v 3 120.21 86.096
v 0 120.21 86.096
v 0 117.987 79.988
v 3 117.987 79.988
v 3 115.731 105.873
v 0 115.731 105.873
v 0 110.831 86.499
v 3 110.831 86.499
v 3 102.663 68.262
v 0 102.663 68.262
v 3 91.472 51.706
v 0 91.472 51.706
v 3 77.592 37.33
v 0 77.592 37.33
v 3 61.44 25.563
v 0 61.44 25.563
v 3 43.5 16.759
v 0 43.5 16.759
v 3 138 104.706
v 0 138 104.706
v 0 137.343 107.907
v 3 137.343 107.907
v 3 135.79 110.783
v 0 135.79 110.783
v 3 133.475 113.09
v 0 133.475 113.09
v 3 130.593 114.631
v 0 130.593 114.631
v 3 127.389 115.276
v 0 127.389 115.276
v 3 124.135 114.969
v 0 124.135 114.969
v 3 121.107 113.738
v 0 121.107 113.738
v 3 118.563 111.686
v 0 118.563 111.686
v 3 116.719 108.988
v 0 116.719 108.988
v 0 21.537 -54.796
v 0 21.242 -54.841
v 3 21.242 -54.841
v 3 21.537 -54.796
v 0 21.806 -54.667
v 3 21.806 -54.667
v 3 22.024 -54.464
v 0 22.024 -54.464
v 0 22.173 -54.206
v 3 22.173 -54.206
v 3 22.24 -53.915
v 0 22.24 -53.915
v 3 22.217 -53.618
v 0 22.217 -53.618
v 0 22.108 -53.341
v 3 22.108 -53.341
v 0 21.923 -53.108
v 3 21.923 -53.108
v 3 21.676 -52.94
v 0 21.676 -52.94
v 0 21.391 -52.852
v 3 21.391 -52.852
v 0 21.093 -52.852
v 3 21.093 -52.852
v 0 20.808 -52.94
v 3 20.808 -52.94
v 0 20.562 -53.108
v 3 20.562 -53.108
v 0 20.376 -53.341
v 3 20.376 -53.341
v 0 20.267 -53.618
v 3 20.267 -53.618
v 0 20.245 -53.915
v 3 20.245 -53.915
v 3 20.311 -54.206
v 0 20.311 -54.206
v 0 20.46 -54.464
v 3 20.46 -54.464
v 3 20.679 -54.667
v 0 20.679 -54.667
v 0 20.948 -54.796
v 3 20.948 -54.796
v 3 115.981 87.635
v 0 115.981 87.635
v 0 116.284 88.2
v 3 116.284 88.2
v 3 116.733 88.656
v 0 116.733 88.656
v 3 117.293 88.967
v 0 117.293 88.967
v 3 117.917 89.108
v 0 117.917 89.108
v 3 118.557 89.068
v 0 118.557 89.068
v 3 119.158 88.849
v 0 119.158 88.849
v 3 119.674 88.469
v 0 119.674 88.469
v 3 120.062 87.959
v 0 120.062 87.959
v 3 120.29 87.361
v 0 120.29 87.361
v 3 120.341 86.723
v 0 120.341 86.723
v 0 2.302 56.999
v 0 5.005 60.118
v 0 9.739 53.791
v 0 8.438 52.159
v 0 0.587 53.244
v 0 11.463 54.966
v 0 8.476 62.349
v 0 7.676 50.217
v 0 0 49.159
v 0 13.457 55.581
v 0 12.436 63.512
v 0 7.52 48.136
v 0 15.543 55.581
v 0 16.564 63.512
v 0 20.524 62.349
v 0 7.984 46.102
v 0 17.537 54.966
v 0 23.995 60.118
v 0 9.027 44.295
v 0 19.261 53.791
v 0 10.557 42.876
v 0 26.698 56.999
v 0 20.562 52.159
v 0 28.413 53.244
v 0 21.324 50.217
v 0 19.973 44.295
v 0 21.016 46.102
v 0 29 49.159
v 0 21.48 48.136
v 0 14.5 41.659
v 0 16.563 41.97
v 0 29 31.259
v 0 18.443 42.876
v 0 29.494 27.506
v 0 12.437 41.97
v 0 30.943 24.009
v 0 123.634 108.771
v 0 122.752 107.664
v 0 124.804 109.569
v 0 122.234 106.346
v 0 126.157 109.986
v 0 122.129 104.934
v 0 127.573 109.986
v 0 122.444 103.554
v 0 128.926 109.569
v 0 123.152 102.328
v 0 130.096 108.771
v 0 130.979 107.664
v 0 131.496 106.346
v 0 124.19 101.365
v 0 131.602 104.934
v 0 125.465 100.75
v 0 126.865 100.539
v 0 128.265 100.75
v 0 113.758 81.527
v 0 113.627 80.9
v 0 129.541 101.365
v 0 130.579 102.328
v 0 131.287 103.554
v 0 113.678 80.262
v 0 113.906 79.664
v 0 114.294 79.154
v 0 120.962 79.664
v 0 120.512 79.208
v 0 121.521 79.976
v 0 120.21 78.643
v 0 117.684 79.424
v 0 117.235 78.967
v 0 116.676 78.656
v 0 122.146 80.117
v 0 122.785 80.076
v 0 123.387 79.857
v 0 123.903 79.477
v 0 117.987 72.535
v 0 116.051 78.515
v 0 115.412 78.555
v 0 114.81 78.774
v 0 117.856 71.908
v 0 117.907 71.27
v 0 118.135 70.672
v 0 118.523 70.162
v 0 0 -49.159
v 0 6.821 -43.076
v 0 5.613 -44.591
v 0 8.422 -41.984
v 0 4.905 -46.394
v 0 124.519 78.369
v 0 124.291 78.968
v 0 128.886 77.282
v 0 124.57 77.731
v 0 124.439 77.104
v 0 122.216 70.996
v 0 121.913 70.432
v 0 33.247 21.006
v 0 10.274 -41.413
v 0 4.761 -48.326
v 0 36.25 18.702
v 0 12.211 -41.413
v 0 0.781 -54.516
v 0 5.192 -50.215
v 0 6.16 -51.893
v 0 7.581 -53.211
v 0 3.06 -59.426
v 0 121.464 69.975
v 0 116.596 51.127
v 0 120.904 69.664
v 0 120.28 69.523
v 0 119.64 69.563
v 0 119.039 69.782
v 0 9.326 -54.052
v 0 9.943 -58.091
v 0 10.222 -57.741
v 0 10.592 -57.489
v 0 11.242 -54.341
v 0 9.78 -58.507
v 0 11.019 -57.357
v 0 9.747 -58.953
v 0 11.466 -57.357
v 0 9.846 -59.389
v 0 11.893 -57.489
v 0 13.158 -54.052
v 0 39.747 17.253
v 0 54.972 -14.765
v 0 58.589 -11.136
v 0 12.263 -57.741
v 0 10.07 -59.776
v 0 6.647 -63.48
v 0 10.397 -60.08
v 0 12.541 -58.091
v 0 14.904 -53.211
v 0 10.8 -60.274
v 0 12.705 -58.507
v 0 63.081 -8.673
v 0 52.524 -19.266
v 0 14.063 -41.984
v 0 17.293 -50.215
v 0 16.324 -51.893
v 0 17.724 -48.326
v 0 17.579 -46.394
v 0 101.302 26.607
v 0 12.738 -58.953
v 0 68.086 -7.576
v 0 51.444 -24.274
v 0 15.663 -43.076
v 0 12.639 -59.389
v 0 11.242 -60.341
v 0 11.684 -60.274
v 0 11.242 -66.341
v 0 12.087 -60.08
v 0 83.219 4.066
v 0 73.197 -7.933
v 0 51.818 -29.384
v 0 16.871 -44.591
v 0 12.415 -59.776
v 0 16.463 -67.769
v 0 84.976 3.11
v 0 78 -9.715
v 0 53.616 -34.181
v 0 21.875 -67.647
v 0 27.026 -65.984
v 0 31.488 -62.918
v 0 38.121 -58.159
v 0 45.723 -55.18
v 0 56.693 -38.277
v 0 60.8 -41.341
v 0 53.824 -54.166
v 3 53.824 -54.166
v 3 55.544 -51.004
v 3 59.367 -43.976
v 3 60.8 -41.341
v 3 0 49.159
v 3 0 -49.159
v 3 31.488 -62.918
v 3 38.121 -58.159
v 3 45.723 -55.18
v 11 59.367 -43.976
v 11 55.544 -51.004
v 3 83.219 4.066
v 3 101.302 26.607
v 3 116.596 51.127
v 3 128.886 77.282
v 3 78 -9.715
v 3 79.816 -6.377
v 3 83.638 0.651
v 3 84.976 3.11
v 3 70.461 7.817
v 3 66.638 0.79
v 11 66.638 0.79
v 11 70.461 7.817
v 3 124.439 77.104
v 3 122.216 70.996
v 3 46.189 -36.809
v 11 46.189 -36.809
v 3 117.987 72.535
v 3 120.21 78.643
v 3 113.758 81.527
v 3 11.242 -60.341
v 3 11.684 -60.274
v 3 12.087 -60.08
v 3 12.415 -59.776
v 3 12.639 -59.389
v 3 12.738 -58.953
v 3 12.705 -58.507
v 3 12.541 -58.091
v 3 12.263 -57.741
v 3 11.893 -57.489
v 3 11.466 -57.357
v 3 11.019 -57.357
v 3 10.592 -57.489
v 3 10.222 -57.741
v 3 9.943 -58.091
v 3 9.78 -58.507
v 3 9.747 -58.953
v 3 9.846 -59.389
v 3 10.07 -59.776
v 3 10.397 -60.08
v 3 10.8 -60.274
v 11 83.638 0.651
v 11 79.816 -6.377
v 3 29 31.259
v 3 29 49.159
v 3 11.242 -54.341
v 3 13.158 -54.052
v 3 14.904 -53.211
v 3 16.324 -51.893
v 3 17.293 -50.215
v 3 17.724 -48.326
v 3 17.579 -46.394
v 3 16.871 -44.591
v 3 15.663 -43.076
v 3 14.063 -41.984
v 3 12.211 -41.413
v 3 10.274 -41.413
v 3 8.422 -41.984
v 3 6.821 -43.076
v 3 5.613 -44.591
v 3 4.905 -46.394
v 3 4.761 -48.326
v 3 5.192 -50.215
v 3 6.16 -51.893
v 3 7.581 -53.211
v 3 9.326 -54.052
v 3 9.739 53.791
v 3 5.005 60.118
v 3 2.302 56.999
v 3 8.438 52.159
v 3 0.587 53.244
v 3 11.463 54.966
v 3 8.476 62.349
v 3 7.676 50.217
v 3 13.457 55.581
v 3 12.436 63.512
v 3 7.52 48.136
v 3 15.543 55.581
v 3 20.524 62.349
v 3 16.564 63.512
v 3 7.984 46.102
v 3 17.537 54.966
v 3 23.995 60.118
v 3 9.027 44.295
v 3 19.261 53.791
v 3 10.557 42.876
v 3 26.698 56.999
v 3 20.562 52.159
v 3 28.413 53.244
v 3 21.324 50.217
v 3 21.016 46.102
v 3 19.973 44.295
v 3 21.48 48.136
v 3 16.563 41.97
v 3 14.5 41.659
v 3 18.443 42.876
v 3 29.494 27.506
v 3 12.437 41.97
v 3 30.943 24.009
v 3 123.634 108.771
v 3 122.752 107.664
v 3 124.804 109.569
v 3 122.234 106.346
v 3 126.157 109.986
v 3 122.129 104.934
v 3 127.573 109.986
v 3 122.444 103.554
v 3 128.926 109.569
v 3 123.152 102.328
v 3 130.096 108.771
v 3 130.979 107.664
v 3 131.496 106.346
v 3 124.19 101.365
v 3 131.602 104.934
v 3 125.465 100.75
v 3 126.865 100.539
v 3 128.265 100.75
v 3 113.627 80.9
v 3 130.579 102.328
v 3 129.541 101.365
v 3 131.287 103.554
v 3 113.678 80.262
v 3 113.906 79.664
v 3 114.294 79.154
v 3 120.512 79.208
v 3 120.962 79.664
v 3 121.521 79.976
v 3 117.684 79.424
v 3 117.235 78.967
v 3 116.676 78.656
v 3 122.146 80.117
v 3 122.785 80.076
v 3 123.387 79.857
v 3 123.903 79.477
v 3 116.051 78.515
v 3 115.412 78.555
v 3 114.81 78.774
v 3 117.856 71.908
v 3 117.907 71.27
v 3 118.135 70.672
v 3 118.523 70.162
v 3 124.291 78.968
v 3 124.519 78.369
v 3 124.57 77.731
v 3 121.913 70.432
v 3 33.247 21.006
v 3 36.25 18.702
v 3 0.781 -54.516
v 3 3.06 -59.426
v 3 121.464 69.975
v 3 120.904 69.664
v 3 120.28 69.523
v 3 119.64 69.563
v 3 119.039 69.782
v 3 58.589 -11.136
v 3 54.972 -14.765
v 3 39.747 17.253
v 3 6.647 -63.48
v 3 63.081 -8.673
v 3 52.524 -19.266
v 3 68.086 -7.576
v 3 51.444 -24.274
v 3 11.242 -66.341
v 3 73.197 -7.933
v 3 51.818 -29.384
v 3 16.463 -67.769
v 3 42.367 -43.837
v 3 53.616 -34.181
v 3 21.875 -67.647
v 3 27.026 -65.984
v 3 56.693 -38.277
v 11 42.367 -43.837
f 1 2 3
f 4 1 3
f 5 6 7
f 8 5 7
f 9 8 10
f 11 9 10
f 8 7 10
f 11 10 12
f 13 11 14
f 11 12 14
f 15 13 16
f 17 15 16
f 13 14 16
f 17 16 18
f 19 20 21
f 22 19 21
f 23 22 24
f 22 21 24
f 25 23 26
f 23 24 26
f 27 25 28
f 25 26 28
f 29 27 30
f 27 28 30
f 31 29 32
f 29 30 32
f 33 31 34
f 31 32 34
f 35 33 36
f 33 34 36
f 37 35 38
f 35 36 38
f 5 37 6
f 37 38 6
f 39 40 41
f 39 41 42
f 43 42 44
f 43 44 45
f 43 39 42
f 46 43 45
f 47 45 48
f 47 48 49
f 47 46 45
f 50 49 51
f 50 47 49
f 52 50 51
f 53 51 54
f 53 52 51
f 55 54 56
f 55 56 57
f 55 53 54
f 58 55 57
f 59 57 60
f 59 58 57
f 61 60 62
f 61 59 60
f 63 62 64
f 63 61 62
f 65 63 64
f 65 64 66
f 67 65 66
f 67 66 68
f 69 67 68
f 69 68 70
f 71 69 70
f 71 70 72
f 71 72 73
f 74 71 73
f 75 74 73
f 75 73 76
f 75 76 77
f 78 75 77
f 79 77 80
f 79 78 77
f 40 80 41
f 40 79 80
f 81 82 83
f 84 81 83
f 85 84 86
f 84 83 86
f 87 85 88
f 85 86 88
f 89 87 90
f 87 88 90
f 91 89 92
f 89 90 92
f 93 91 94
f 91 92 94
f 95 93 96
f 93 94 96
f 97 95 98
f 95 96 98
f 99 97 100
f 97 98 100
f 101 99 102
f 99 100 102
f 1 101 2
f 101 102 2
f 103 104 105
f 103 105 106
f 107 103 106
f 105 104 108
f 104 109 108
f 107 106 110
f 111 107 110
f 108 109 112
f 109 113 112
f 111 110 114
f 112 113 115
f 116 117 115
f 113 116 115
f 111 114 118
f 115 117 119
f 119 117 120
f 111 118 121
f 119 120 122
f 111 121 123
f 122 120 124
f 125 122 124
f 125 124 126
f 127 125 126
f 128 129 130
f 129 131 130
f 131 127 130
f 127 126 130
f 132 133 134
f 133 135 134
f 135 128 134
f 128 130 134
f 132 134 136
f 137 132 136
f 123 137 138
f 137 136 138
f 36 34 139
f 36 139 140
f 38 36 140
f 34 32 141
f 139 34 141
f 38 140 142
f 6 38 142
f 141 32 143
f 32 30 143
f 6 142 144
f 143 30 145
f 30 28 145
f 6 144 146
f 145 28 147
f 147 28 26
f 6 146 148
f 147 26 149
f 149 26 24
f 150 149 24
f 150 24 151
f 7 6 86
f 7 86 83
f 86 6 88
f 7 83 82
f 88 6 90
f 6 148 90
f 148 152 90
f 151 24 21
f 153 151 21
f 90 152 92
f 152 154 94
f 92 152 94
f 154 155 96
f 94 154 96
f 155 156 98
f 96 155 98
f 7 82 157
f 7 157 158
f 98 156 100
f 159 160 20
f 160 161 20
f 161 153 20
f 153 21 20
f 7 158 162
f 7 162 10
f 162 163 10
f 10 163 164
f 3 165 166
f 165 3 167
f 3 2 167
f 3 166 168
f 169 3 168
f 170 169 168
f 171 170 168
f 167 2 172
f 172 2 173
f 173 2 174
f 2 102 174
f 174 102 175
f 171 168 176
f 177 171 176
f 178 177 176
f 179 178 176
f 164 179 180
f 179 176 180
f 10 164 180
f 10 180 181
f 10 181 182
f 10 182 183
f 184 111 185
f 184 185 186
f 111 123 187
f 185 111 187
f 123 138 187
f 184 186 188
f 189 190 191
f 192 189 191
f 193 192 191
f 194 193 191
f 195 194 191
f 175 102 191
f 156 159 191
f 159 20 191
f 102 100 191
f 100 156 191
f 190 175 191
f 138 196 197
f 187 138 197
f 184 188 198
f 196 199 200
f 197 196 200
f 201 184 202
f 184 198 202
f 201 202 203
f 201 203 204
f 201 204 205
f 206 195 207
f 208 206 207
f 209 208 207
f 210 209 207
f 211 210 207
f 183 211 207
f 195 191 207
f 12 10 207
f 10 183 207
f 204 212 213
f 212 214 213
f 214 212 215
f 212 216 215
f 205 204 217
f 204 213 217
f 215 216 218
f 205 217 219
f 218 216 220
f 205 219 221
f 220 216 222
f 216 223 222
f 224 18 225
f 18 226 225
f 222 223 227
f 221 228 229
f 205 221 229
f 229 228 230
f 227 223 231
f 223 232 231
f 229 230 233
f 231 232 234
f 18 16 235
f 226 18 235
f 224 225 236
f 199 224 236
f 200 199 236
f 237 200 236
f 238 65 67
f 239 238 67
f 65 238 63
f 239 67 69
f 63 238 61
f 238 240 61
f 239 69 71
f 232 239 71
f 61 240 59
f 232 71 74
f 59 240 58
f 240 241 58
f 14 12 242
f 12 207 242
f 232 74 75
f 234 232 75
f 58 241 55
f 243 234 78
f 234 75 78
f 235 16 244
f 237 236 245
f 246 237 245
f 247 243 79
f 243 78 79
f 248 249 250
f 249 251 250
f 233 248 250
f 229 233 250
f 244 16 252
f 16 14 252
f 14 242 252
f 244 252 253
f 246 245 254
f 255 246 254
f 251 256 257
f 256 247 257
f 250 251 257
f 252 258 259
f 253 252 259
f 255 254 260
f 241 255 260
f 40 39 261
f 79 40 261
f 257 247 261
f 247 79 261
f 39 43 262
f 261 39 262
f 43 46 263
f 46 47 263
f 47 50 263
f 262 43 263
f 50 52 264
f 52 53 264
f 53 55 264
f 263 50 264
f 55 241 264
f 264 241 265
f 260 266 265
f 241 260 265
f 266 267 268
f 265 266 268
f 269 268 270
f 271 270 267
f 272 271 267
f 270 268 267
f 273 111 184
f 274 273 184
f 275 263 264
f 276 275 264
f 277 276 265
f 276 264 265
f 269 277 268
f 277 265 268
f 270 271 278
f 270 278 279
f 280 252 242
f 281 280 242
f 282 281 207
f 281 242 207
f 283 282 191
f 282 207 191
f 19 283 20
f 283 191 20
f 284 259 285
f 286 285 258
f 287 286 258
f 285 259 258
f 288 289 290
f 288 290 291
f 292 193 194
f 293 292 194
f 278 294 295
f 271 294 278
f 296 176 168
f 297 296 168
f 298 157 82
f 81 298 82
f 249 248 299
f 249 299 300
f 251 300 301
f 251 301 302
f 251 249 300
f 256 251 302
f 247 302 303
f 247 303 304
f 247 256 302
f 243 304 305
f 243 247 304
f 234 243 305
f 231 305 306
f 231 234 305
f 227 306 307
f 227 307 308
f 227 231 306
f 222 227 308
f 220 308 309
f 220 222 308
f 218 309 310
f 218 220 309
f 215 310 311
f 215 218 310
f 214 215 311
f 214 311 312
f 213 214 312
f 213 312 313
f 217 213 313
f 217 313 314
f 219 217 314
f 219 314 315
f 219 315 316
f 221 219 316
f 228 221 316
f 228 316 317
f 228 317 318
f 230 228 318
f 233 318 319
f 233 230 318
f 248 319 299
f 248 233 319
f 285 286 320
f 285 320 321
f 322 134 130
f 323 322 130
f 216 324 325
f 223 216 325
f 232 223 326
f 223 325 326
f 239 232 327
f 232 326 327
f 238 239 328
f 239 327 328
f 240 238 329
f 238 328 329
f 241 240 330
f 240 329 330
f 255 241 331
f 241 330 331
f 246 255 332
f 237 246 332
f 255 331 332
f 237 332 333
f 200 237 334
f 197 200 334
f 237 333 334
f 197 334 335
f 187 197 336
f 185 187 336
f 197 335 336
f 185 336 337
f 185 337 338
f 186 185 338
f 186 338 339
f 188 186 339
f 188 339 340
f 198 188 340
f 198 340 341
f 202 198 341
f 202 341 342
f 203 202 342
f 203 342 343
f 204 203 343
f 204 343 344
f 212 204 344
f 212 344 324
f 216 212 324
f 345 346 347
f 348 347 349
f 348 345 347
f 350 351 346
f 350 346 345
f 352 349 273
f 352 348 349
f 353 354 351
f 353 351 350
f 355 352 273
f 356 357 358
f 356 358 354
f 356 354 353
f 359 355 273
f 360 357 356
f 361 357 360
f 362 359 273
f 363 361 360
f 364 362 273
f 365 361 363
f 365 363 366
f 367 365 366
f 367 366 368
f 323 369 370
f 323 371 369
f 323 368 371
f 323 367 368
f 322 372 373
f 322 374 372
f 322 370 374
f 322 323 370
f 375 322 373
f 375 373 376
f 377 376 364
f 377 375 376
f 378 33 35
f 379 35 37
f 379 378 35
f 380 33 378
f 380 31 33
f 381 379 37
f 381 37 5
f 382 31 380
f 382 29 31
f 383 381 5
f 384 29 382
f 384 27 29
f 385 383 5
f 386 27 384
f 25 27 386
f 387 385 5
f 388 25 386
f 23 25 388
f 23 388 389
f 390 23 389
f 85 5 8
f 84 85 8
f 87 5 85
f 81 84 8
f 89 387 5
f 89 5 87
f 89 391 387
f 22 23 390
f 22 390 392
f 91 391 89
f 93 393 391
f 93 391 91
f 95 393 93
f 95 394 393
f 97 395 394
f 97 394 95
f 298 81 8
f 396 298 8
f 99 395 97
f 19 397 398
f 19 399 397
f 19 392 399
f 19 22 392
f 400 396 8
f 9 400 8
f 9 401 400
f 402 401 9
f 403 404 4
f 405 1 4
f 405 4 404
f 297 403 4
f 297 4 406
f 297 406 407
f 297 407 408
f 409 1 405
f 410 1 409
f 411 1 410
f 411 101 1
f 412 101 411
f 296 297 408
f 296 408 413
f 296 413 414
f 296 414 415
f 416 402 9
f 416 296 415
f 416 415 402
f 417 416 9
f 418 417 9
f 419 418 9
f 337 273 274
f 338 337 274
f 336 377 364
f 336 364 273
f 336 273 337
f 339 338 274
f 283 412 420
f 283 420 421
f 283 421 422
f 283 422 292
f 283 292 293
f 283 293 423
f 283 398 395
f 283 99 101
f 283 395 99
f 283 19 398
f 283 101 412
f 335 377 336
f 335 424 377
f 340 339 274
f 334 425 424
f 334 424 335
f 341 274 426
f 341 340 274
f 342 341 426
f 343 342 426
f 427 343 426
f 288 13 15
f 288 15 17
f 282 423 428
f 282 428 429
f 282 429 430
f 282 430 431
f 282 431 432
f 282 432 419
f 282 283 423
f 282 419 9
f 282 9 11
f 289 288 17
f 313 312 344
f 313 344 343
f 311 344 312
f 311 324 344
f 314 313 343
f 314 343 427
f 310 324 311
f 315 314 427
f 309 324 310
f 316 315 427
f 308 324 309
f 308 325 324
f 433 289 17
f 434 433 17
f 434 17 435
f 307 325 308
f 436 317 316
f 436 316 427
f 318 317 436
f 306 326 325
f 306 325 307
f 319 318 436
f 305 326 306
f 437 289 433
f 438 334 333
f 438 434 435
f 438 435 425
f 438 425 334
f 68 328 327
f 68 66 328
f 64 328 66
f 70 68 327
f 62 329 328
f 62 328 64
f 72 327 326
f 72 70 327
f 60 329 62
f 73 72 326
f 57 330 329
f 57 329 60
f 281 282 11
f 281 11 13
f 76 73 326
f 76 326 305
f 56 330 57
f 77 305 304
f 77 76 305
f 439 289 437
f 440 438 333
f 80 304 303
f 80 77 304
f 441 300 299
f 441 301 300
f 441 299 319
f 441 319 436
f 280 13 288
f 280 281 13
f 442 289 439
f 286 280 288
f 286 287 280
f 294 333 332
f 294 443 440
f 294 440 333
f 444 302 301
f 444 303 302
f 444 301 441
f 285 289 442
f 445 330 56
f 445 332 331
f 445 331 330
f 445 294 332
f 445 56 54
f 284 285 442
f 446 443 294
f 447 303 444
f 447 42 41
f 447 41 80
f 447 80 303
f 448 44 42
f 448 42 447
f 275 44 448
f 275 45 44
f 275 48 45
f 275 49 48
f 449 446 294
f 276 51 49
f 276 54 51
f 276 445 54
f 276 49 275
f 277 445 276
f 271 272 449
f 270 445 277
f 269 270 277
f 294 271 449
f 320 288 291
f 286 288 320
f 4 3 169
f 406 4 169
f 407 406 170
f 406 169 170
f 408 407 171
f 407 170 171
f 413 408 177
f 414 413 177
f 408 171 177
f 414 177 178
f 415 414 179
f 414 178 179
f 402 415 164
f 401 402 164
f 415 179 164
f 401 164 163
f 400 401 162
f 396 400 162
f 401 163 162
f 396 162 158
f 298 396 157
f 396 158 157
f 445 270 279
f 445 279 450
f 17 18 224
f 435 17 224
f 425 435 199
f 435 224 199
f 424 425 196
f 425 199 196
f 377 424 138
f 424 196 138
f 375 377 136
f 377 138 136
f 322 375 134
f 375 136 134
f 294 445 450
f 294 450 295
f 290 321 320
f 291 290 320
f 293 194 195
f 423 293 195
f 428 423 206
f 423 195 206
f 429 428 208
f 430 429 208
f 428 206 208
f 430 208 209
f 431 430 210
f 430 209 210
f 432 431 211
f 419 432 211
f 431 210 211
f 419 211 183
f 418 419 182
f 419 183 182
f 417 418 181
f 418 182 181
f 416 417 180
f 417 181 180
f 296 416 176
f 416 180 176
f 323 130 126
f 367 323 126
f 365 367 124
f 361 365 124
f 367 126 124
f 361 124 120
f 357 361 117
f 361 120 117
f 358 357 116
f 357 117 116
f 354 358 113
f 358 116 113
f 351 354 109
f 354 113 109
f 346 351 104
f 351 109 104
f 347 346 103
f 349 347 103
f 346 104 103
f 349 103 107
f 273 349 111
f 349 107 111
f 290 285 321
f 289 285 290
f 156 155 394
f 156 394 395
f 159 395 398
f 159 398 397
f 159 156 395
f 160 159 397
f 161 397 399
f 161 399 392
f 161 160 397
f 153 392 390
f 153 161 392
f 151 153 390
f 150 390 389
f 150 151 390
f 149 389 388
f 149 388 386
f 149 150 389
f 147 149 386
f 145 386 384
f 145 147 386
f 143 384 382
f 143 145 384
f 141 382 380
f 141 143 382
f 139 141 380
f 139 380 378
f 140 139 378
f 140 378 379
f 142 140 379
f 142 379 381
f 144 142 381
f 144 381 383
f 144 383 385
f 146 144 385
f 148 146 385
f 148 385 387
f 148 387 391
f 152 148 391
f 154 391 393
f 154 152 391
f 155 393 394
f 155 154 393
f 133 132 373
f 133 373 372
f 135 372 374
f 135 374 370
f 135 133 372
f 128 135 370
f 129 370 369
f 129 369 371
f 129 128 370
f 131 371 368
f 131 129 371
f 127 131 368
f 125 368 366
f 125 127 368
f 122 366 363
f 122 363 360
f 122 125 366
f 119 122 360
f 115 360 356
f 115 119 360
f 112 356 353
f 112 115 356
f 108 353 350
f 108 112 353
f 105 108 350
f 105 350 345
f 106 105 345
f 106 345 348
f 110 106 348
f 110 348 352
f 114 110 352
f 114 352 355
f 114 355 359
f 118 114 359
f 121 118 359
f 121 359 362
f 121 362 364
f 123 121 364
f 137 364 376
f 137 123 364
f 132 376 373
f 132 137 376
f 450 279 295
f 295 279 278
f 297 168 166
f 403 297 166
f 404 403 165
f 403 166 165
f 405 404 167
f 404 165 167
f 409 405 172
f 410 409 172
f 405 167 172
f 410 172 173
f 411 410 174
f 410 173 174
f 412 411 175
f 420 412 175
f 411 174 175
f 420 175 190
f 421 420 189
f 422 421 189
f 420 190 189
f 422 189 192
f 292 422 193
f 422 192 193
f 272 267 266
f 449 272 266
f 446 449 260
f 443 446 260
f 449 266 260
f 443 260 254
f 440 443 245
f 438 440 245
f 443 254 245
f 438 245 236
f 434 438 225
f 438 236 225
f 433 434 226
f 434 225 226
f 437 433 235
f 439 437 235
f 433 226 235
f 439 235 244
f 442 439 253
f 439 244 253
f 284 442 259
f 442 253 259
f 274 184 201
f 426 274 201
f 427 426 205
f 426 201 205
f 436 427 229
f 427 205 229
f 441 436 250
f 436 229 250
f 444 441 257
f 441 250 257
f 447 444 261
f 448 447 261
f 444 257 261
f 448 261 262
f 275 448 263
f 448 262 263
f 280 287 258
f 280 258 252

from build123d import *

# Parameters (mm, degrees)
SKETCH1_R           = 1.5
SKETCH1_R_2         = 1
SKETCH1_R_3         = 7
SKETCH1_R_4         = 4.75
BOSS_EXTRUDE1_DEPTH = 3
BOSS_EXTRUDE2_DEPTH = 8
SKETCH4_R           = 6.5
CUT_EXTRUDE1_DEPTH  = 10


with BuildPart() as part:
    # Sketch1 → Boss-Extrude1 (new body)
    with BuildSketch(Plane(origin=(0, 0, 0), x_dir=(0, 0, -1), z_dir=(1, 0, 0))):
        with BuildLine():
            Line((-49.159345461, 0), (49.159345461, 0))
            ThreePointArc((49.159345461, 0), (66.340654539, 11.242329364), (62.91845049, 31.487720707))
            ThreePointArc((62.91845049, 31.487720707), (56.432557087, 41.829379484), (54.166473214, 53.824444444))
            Line((54.166473214, 53.824444444), (41.340654539, 60.8))
            ThreePointArc((41.340654539, 60.8), (16.928001378, 53.587346839), (9.715348216, 78))
            Line((9.715348216, 78), (-3.110470459, 84.975555556))
            Line((-3.110470459, 84.975555556), (-4.066026015, 83.218594093))
            ThreePointArc((-4.066026015, 83.218594093), (-51.126972403, 116.596460909), (-104.705915866, 138))
            ThreePointArc((-104.705915866, 138), (-115.275757126, 127.38864025), (-105.87300769, 115.730561375))
            ThreePointArc((-105.87300769, 115.730561375), (-51.706077225, 91.471635272), (-16.759345461, 43.5))
            ThreePointArc((-16.759345461, 43.5), (-21.006297134, 33.246951673), (-31.259345461, 29))
            Line((-31.259345461, 29), (-49.159345461, 29))
            ThreePointArc((-49.159345461, 29), (-63.659345461, 14.5), (-49.159345461, 0))
        make_face()
        with Locations((58.840654539, 11.242329364)):
            Circle(SKETCH1_R, mode=Mode.SUBTRACT)
        with Locations((53.840654539, 21.242329364)):
            Circle(SKETCH1_R_2, mode=Mode.SUBTRACT)
        with Locations((-48.659345461, 14.5)):
            Circle(SKETCH1_R_3, mode=Mode.SUBTRACT)
        with Locations((-105.289461778, 126.865280687)):
            Circle(SKETCH1_R_4, mode=Mode.SUBTRACT)
        with BuildLine():
            Line((45.840654539, 15.742329364), (47.840654539, 15.742329364))
            ThreePointArc((47.840654539, 15.742329364), (52.340654539, 11.242329364), (47.840654539, 6.742329364))
            Line((47.840654539, 6.742329364), (45.840654539, 6.742329364))
            ThreePointArc((45.840654539, 6.742329364), (41.340654539, 11.242329364), (45.840654539, 15.742329364))
        make_face(mode=Mode.SUBTRACT)
        with BuildLine():
            Line((-86.096000708, 120.210043762), (-79.987998673, 117.98691283))
            ThreePointArc((-79.987998673, 117.98691283), (-78.643235599, 115.103059111), (-81.527089318, 113.758296037))
            Line((-81.527089318, 113.758296037), (-87.635091353, 115.981426968))
            ThreePointArc((-87.635091353, 115.981426968), (-88.979854428, 118.865280687), (-86.096000708, 120.210043762))
        make_face(mode=Mode.SUBTRACT)
        with BuildLine():
            Line((-77.104144954, 124.438660555), (-70.996142919, 122.215529624))
            ThreePointArc((-70.996142919, 122.215529624), (-69.651379845, 119.331675904), (-72.535233564, 117.98691283))
            Line((-72.535233564, 117.98691283), (-78.643235599, 120.210043762))
            ThreePointArc((-78.643235599, 120.210043762), (-79.987998673, 123.093897481), (-77.104144954, 124.438660555))
        make_face(mode=Mode.SUBTRACT)
    extrude(amount=BOSS_EXTRUDE1_DEPTH)

    # Sketch2 → Boss-Extrude2 (add)
    with BuildSketch(Plane(origin=(3, 0, 0), x_dir=(0, 0, -1), z_dir=(1, 0, 0))):
        Polygon((43.976096732, 59.366666667), (51.003942582, 55.544444444), (43.837275915, 42.367233477), (36.809430066, 46.189455699), align=None)
        Polygon((-0.650724412, 83.637777778), (6.377121438, 79.815555556), (-0.789545229, 66.638344588), (-7.817391078, 70.46056681), align=None)
    extrude(amount=BOSS_EXTRUDE2_DEPTH)

    # Sketch4 → Cut-Extrude1 (cut)
    with BuildSketch(Plane(origin=(3, 0, 0), x_dir=(0, 0, -1), z_dir=(1, 0, 0))):
        with Locations((47.840654539, 11.242329364)):
            Circle(SKETCH4_R)
    extrude(amount=-CUT_EXTRUDE1_DEPTH, mode=Mode.SUBTRACT)


solid = part.part
